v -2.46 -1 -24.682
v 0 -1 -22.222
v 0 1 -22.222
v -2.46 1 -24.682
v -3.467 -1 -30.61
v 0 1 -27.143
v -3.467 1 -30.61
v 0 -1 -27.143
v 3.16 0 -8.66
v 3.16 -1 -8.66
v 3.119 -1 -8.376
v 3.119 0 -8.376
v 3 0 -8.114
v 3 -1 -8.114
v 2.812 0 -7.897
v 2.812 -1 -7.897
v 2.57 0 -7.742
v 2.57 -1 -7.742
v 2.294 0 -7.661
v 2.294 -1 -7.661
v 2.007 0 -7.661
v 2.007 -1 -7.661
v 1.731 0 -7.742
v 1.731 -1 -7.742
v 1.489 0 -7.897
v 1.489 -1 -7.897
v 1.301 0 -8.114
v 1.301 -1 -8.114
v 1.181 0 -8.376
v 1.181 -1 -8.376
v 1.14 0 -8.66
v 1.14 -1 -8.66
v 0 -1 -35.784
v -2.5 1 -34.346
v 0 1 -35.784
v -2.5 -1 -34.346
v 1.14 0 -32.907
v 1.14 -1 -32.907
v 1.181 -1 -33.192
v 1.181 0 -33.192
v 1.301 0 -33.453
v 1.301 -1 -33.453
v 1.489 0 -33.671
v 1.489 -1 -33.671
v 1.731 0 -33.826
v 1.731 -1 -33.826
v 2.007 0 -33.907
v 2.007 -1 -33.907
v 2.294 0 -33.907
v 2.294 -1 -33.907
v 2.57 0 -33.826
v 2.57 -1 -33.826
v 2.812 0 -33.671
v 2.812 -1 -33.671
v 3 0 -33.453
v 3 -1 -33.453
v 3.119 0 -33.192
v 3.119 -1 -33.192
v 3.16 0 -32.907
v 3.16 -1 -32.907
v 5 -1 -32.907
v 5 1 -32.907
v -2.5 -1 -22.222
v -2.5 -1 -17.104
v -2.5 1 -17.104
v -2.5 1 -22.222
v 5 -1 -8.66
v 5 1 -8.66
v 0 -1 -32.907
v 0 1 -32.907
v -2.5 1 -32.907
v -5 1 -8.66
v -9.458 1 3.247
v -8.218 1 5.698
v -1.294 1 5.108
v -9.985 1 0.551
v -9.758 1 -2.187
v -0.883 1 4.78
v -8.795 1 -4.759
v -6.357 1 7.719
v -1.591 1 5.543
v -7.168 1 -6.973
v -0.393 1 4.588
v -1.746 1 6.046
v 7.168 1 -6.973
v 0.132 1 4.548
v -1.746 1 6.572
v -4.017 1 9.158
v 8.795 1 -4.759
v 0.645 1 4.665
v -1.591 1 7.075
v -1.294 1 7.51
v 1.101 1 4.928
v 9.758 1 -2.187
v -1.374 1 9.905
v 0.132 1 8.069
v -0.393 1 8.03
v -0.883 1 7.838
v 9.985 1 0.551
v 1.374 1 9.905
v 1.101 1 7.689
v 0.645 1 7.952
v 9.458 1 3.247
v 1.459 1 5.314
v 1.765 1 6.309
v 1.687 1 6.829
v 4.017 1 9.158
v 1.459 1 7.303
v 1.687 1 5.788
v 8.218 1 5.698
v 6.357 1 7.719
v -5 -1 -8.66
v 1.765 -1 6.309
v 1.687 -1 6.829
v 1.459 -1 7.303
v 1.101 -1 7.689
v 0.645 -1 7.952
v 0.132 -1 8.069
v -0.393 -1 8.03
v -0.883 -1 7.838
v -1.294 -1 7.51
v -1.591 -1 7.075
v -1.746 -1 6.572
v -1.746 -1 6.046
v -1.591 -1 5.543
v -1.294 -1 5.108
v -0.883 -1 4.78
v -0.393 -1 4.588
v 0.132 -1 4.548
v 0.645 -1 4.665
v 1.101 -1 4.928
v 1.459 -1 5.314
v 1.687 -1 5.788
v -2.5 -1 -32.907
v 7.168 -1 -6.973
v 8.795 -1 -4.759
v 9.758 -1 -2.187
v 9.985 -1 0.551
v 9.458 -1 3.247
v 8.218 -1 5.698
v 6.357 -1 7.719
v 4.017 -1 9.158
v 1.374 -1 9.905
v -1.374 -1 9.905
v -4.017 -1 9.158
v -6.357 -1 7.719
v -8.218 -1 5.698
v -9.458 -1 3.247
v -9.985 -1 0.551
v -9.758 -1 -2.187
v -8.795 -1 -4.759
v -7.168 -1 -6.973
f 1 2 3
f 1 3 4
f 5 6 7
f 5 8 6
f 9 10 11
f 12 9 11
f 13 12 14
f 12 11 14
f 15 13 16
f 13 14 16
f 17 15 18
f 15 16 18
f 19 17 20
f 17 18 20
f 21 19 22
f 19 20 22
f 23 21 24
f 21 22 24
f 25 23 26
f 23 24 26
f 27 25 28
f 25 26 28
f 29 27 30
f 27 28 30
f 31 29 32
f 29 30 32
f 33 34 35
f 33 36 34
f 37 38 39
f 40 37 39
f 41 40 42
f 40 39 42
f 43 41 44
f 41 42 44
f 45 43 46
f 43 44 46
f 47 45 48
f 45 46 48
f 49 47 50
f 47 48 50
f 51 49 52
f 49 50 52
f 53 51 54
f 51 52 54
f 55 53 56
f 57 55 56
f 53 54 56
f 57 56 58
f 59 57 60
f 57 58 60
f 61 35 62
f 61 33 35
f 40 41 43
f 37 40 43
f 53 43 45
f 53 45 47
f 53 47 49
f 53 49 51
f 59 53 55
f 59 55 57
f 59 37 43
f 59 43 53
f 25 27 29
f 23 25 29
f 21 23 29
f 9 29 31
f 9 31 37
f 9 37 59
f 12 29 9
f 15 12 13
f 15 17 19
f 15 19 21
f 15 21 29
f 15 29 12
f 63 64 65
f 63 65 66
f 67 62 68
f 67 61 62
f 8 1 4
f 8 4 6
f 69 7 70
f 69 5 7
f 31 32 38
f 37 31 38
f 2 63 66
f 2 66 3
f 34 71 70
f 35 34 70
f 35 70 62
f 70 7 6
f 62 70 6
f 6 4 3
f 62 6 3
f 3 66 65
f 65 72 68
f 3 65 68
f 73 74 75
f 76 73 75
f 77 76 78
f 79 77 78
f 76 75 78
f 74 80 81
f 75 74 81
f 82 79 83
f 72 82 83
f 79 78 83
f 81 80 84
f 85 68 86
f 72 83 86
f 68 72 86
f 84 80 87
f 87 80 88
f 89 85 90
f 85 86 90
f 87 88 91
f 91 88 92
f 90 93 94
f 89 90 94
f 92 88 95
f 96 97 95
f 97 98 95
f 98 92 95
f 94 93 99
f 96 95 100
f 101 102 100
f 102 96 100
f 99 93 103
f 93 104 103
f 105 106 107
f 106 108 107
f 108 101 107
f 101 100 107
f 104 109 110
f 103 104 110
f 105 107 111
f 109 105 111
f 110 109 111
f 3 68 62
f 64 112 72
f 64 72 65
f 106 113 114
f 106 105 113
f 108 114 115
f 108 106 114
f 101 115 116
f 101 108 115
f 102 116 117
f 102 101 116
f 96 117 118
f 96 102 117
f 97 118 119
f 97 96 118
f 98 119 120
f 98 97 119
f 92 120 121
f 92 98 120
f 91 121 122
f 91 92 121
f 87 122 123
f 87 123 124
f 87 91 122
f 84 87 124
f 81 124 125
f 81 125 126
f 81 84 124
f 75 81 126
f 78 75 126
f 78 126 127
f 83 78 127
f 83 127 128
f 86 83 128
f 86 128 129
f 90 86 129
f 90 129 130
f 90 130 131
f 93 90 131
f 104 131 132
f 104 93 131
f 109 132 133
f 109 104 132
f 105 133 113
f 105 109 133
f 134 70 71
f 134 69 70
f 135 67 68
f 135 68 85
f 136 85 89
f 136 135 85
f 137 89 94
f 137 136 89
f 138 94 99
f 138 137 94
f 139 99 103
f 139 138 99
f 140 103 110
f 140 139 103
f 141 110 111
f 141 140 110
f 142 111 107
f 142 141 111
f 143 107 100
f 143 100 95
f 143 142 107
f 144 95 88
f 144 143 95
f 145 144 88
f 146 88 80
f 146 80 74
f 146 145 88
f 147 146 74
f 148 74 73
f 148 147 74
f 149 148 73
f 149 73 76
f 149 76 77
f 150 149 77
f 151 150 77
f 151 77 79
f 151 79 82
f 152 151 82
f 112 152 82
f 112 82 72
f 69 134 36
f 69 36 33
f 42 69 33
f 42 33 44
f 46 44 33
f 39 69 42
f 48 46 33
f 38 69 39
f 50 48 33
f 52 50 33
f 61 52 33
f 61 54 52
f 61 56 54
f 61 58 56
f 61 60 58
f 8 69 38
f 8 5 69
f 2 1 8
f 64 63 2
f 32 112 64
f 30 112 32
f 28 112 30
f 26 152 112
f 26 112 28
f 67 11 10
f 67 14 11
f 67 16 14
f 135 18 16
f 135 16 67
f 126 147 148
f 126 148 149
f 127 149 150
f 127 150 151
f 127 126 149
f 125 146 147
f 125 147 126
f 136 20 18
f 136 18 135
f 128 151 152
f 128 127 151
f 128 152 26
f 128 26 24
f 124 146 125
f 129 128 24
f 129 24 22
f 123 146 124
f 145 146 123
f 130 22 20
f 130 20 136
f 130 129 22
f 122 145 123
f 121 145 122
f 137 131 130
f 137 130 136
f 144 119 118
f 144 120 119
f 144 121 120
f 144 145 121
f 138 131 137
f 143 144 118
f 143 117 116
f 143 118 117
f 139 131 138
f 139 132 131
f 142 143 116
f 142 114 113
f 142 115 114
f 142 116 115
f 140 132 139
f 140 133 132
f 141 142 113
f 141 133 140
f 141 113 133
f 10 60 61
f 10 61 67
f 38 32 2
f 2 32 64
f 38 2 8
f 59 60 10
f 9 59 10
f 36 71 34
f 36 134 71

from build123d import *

# Parameters (mm, degrees)
F0_R     = 1.765447
F1_DEPTH = 1
F3_DEPTH = 1


with BuildPart() as f1:
    # F0 (on Front) → F1 (new body, symmetric)
    with BuildSketch(Plane.XZ):
        with BuildLine():
            Line((5, -32.907251), (5, -8.660254))
            ThreePointArc((5, -8.660254), (0, 10), (-5, -8.660254))
            Line((-5, -8.660254), (-2.5, -17.104119))
            Line((-2.5, -17.104119), (-2.5, -22.222003))
            Line((-2.5, -22.222003), (0, -22.222003))
            Line((0, -22.222003), (-2.460267, -24.68227))
            Line((-2.460267, -24.68227), (0, -27.142537))
            Line((0, -27.142537), (-3.467242, -30.609779))
            Line((-3.467242, -30.609779), (0, -32.907251))
            Line((0, -32.907251), (-2.5, -32.907251))
            Line((-2.5, -32.907251), (-2.5, -34.345502))
            Line((-2.5, -34.345502), (0, -35.783753))
            Line((0, -35.783753), (5, -32.907251))
        make_face()
        with Locations((0, 6.308739)):
            Circle(F0_R, mode=Mode.SUBTRACT)
    extrude(amount=F1_DEPTH, both=True)

    # F2 (on face) → F3 (cut)
    with BuildSketch(Plane.XZ.offset(1)):
        with BuildLine():
            Line((3.160392, -32.907251), (3.160392, -8.660254))
            ThreePointArc((3.160392, -8.660254), (2.150394, -7.650256), (1.140397, -8.660254))
            Line((1.140397, -8.660254), (1.140397, -32.907251))
            ThreePointArc((1.140397, -32.907251), (2.150394, -33.917249), (3.160392, -32.907251))
        make_face()
    extrude(amount=-F3_DEPTH, mode=Mode.SUBTRACT)


solid = f1.part
